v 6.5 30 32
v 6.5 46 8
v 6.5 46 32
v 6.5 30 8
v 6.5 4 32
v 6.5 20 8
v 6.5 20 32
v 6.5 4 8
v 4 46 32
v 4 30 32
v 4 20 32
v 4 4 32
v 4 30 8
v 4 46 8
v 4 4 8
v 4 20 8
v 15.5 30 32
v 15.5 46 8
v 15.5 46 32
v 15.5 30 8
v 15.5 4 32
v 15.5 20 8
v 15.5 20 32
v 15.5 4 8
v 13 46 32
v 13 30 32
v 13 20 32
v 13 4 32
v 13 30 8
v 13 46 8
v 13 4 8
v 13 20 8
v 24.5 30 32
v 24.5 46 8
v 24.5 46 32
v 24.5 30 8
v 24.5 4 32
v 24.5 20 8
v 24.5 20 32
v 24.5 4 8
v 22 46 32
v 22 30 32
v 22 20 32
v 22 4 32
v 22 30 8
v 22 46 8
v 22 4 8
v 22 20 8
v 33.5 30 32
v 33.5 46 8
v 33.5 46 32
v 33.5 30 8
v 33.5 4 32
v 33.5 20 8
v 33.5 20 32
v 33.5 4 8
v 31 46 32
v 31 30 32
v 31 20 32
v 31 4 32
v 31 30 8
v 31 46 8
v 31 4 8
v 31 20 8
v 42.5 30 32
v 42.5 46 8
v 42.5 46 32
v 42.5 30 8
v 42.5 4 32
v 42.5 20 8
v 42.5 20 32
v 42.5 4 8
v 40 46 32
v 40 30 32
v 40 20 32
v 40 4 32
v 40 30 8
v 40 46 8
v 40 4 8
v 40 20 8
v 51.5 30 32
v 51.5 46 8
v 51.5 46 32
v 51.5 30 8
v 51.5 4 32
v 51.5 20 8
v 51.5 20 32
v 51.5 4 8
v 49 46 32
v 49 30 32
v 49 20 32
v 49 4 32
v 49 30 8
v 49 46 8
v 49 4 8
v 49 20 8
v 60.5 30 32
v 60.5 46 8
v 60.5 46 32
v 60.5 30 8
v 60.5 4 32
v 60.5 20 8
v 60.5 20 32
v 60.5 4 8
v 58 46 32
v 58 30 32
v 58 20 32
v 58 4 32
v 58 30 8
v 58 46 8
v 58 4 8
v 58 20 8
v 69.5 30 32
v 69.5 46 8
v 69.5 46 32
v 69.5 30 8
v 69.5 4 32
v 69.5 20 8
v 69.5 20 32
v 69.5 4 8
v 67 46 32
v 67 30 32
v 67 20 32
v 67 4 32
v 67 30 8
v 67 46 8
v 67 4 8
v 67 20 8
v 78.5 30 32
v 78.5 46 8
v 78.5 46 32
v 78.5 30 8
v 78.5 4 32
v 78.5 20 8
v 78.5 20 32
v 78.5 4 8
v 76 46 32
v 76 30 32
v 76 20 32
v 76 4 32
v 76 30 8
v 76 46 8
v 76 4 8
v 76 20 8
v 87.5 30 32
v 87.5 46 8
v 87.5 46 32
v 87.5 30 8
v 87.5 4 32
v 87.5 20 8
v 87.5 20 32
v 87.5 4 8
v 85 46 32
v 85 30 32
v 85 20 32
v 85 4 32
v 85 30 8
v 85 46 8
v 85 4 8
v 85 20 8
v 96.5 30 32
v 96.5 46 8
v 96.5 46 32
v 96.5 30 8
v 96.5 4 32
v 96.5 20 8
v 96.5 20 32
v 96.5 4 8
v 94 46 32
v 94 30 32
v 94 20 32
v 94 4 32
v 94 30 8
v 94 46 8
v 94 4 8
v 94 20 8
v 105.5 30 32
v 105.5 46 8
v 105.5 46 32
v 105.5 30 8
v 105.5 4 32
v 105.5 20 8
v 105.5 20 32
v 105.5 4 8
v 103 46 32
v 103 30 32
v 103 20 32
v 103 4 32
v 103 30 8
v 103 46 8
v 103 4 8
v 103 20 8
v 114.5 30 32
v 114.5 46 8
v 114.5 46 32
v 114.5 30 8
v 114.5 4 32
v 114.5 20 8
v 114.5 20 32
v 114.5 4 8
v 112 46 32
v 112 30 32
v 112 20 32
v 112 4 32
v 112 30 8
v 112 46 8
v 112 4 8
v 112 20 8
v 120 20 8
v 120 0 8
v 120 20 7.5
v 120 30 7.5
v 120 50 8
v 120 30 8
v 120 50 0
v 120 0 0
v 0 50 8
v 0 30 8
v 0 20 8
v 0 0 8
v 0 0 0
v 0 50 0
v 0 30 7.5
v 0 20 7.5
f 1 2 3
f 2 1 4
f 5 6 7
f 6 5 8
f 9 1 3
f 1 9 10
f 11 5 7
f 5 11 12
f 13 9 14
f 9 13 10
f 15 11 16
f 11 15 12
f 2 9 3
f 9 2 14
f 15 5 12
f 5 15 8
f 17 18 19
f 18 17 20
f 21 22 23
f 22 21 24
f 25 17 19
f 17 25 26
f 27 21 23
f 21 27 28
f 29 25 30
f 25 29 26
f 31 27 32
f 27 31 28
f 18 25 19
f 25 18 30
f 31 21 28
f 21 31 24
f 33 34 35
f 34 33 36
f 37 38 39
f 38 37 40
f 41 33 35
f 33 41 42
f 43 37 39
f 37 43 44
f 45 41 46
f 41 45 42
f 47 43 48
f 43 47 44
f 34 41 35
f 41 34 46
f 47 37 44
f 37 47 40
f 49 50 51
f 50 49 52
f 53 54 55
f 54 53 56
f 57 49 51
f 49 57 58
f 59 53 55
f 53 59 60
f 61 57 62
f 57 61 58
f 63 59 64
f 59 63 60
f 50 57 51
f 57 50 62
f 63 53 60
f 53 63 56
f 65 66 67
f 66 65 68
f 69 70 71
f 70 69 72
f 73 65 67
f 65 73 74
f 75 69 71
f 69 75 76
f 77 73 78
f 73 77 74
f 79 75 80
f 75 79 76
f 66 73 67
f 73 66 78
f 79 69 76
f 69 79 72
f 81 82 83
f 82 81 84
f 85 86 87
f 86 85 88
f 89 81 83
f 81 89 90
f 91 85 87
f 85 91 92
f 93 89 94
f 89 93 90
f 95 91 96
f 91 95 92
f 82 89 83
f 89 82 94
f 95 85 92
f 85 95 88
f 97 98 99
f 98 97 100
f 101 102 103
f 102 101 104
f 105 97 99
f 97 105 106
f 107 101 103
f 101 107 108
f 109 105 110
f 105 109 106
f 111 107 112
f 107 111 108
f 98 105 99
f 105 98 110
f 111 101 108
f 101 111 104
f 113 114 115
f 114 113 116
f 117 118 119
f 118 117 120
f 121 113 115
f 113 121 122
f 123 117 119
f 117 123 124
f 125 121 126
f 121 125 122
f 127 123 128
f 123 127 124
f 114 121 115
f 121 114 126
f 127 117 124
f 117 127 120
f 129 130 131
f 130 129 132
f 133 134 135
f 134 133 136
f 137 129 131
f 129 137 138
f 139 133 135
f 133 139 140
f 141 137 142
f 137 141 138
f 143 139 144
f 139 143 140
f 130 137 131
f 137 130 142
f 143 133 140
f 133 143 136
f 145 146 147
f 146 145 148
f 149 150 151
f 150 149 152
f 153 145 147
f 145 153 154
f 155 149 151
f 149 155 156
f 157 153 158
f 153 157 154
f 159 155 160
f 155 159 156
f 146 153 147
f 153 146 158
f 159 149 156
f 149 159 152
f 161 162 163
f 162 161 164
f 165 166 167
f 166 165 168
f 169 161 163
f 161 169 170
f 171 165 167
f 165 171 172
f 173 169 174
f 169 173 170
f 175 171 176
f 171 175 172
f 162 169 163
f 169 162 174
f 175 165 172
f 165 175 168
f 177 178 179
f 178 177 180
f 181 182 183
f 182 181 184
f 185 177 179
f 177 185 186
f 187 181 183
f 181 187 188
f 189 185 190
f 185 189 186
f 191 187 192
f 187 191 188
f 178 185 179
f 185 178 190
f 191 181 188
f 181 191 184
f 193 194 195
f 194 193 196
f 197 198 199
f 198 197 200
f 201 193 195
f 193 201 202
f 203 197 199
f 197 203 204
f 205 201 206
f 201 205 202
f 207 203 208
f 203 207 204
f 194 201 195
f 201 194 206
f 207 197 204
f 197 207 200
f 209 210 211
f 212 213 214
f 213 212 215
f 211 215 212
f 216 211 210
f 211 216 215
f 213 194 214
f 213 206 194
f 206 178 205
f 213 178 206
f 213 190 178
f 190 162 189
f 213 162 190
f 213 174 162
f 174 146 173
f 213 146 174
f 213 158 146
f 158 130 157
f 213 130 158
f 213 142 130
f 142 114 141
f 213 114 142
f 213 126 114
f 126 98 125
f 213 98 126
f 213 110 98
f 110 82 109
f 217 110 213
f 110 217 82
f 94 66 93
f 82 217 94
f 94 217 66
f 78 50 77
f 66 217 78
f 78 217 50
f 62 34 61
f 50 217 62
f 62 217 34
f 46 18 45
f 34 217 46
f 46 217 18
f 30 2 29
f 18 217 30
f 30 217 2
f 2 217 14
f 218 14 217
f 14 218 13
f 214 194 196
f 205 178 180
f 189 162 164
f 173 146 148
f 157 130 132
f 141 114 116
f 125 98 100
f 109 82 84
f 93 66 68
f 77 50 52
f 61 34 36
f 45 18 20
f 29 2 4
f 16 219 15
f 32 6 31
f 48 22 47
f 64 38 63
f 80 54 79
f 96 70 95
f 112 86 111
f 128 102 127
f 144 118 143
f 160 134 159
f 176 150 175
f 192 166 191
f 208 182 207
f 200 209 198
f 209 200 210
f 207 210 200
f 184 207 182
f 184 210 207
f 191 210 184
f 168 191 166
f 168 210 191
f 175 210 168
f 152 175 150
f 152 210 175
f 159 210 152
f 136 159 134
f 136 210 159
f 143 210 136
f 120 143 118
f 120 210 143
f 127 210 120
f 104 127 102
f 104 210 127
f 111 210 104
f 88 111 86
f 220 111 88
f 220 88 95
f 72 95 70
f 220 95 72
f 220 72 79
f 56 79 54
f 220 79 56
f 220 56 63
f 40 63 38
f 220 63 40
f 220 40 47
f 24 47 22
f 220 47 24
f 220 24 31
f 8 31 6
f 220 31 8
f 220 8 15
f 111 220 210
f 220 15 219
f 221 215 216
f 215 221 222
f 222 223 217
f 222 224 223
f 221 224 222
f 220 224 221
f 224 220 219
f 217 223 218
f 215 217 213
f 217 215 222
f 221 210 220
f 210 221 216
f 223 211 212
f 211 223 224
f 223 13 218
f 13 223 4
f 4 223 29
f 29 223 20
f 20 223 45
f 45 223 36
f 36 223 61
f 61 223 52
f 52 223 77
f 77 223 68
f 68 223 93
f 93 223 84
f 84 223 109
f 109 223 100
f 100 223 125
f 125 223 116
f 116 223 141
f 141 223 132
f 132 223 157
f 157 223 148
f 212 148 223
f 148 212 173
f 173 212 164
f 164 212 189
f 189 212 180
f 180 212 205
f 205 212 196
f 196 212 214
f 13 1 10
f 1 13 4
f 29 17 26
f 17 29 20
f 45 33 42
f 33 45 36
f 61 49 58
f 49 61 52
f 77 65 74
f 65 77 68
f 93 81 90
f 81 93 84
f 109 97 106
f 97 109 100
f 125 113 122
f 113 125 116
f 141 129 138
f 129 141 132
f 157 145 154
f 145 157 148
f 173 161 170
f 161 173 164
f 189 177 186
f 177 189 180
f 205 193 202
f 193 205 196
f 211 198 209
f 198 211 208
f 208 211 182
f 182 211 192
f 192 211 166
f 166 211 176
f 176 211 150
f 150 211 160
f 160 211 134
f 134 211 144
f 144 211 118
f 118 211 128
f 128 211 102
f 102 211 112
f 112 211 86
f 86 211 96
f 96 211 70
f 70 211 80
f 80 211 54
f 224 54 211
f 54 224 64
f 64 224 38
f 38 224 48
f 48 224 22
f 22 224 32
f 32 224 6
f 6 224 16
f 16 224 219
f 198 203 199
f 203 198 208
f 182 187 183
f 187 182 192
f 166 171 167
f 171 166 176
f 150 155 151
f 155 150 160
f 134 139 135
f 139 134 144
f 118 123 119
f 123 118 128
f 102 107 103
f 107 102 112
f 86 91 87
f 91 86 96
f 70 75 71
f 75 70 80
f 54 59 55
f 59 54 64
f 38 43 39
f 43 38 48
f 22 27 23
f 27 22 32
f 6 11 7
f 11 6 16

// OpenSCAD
$fn = 32;

// ----------------------------------------------------------------------
// Heatsink: slotted fin block
// ----------------------------------------------------------------------

// --- parameters (mm) ---
base_l = 120;             // base length, X
base_w = 50;              // base width, Y
base_t = 8;               // base plate thickness
fin_h = 25;               // fin height above the base
fin_t = 2.5;              // fin thickness
edge = 4;                 // margin from the base ends
pitch = 9;                // fin pitch
slot_w = 10;              // central slot width, Y

n_fins = floor((base_l - 2 * edge - fin_t) / pitch) + 1;  // fin count
total_h = base_t + fin_h - 1;  // overall height

difference() {
union() {
  cube([base_l, base_w, base_t]);
  for (i = [0 : n_fins - 1])
    translate([edge + i * pitch, edge, base_t - 1])
      cube([fin_t, base_w - 2 * edge, fin_h]);
}
  translate([-1, base_w / 2 - slot_w / 2, base_t - 0.5])
    cube([base_l + 2, slot_w, fin_h + 2]);
}
